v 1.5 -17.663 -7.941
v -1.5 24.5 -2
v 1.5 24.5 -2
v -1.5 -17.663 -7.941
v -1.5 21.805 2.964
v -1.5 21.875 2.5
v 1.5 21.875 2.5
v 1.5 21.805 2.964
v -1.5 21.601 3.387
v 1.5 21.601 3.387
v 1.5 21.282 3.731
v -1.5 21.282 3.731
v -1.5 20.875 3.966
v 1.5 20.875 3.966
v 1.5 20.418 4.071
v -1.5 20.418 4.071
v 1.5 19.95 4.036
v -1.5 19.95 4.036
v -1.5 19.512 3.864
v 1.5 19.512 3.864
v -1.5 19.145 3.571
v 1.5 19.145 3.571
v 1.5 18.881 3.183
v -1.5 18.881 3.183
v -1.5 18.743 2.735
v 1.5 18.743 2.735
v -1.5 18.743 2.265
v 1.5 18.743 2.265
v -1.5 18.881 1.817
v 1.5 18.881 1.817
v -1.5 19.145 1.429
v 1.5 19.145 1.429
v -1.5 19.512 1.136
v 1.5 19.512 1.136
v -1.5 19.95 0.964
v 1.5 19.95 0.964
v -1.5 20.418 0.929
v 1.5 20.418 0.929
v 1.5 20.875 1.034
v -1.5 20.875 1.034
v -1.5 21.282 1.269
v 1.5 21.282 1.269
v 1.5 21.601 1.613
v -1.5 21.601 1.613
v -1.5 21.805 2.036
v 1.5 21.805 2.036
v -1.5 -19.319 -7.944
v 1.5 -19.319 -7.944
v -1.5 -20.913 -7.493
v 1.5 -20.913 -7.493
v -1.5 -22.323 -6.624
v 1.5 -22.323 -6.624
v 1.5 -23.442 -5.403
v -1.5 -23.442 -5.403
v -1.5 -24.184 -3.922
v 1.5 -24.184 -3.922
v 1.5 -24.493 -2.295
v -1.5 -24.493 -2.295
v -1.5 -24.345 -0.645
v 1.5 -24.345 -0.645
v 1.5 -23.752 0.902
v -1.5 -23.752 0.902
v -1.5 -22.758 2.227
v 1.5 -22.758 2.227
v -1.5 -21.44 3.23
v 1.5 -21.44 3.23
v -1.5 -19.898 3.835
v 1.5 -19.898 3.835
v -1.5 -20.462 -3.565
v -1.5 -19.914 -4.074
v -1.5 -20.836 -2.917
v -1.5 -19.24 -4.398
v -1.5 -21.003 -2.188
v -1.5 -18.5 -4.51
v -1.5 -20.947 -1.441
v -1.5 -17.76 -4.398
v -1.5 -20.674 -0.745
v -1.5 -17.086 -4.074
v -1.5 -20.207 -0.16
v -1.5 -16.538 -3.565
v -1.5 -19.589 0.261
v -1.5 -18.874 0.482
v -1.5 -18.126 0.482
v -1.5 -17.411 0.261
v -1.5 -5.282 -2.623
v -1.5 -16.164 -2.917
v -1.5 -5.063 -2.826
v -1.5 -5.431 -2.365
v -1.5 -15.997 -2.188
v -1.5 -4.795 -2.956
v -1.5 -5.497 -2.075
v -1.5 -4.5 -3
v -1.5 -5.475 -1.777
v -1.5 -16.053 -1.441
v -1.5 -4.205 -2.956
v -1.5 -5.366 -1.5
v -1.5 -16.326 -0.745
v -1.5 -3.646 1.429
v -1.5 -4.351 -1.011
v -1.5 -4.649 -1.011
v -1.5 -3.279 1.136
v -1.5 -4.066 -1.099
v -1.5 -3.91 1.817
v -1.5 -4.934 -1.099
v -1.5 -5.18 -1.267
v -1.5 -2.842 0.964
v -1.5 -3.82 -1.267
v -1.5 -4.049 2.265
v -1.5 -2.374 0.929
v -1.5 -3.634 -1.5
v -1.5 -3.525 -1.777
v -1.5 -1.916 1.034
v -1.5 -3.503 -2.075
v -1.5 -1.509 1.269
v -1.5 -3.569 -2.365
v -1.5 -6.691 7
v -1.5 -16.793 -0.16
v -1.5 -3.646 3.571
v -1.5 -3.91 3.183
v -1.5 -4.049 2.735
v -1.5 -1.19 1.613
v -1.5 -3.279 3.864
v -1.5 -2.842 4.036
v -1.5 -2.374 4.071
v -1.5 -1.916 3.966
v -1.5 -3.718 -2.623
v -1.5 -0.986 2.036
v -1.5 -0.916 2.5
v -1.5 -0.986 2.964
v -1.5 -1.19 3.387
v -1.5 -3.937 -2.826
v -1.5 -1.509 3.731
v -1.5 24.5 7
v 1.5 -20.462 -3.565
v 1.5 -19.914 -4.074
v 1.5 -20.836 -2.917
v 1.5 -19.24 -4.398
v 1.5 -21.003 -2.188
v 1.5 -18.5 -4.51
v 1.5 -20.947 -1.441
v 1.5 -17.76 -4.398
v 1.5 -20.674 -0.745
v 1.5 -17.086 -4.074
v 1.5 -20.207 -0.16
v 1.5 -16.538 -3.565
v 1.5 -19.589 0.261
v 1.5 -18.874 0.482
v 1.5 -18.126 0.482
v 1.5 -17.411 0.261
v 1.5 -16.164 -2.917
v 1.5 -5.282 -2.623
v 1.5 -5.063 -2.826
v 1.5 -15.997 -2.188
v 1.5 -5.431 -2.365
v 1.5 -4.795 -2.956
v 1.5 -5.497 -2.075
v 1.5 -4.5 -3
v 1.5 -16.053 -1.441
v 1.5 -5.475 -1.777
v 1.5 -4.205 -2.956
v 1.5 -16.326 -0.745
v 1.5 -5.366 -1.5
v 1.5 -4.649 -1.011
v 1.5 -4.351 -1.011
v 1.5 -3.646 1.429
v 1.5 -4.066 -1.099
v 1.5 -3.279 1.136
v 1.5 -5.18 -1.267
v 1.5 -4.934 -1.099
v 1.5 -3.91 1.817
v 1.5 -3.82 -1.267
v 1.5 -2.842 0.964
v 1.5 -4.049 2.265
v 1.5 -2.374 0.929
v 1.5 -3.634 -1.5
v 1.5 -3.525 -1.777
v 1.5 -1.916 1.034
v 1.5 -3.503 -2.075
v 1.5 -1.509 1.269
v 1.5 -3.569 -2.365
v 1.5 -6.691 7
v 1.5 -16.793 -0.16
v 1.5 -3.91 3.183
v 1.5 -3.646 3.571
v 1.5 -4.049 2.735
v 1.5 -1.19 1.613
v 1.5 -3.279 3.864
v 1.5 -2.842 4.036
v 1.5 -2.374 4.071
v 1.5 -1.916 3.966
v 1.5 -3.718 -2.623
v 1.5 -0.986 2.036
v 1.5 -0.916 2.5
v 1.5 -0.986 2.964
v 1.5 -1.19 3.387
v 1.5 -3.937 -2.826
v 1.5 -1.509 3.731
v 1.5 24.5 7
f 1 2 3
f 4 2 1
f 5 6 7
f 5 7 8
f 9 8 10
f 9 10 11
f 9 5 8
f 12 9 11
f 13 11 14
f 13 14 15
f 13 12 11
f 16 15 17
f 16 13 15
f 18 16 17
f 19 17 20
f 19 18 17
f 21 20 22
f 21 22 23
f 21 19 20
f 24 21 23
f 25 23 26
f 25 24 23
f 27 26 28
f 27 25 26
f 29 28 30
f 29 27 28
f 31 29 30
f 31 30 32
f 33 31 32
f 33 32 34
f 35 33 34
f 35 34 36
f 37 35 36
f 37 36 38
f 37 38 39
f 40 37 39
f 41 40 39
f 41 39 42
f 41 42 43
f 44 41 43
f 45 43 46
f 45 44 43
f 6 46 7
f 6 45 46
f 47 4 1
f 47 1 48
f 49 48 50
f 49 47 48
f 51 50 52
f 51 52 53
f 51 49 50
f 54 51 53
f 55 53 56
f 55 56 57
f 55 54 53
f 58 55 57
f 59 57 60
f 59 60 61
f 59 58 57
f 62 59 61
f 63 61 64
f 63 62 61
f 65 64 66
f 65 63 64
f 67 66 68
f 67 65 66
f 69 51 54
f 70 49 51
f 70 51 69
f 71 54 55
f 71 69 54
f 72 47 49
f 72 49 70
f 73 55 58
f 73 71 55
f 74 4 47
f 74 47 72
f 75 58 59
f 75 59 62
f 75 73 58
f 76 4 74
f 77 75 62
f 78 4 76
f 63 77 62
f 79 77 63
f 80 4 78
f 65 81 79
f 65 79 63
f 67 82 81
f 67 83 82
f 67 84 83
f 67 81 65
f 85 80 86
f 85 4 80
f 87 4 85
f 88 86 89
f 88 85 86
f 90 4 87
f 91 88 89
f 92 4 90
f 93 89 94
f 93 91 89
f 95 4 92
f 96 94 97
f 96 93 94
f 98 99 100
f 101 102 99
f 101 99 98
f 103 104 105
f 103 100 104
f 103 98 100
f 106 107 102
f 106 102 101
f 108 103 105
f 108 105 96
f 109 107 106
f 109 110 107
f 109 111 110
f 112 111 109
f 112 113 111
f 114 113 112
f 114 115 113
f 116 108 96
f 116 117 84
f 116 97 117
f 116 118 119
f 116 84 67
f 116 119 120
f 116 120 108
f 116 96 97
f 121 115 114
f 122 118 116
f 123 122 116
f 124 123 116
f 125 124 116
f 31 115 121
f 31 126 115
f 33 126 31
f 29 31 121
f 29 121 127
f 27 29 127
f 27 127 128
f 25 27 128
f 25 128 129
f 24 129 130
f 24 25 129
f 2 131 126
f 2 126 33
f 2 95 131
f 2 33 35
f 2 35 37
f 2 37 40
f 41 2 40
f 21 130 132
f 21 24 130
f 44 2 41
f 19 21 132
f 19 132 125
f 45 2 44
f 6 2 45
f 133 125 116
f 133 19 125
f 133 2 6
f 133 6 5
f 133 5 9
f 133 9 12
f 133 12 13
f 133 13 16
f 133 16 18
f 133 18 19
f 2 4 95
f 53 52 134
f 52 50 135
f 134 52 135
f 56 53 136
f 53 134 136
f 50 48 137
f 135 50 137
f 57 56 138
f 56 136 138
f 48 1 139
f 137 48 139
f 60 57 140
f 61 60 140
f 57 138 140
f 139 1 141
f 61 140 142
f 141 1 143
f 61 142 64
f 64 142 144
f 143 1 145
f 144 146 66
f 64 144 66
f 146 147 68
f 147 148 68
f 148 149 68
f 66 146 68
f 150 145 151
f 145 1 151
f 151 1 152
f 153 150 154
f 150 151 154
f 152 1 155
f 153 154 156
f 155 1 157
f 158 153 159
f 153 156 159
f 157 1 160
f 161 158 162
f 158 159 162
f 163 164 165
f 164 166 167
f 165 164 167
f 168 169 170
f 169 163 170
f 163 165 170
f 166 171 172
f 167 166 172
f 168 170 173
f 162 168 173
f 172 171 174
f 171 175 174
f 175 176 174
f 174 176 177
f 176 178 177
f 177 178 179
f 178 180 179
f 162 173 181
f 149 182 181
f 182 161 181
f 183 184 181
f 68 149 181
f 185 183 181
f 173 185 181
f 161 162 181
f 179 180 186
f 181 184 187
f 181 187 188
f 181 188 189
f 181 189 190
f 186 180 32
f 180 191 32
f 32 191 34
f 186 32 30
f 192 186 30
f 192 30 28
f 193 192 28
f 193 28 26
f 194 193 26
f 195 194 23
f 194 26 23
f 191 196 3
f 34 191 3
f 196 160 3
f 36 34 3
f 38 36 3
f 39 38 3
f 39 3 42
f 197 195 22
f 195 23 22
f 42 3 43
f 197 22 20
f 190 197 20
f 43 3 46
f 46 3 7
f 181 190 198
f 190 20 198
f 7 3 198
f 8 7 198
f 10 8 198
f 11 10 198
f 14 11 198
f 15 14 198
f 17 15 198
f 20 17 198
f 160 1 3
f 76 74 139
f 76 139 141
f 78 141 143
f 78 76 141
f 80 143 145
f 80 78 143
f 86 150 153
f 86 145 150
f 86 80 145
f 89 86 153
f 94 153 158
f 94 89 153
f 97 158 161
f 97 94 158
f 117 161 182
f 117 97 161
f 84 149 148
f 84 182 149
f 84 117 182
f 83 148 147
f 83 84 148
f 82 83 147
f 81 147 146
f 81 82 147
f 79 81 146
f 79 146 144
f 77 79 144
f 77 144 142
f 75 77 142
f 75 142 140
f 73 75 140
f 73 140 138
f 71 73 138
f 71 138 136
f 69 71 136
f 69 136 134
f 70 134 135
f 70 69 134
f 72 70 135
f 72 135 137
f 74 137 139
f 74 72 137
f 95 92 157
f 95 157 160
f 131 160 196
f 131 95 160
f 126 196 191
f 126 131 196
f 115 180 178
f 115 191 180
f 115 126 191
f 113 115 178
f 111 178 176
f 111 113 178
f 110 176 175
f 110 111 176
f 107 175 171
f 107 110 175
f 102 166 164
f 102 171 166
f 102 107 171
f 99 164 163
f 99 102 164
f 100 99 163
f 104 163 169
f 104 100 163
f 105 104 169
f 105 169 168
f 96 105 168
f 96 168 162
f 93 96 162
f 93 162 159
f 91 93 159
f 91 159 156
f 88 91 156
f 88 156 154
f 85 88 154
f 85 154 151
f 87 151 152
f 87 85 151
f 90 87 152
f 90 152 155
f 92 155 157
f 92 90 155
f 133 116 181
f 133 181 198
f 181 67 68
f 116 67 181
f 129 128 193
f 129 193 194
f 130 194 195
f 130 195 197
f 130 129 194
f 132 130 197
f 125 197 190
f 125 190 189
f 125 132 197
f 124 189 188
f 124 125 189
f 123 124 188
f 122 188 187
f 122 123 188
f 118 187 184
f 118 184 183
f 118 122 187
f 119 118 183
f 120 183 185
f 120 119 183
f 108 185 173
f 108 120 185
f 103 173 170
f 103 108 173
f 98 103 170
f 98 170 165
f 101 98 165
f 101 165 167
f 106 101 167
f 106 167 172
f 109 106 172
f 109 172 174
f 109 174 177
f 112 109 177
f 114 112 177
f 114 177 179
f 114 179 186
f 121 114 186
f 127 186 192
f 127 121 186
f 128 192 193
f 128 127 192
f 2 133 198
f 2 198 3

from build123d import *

# Parameters (mm, degrees)
BOSS_EXTRUDE1_START                        = -1.5
BOSS_EXTRUDE1_DEPTH                        = 3
PIVOTSHAFTHOLE_CUT_DEPTH                   = 26.816661287
PIVOTSHAFTHOLE_CUT_DEPTH_BACK              = 26.816661287
PIVOTSHAFTHOLE_SKETCH_R                    = 2.51
MOUNTHOLESTOENDBLOCKSEEDFODDER_START       = -1.5
MOUNTHOLESTOENDBLOCKSEEDFODDER_OUTLINE_R   = 2.51
MOUNTHOLESTOENDBLOCKSEEDFODDER_DEPTH       = 3
MOUNTHOLESTOENDBLOCKSEED_SKETCH_R          = 1.575
MOUNTHOLESTOENDBLOCKSEED_CUT_DEPTH         = 26.816661287
MOUNTHOLESTOENDBLOCKSEED_PATTERN_START     = -1.5
MOUNTHOLESTOENDBLOCKSEED_PATTERN_OUTLINE_R = 1.575
MOUNTHOLESTOENDBLOCKSEED_PATTERN_DEPTH     = 3
SPRINGANCHORHOLE_CUT_DEPTH                 = 26.816661287
SPRINGANCHORHOLE_CUT_DEPTH_BACK            = 26.816661287
SPRINGANCHORHOLE_SKETCH_R                  = 1


# Read off the part's stored shape, not the designer's step: mountHolesToEndBlockSeedFodder, mountHolesToEndBlockSeed_pattern
with BuildPart() as part:
    # Sketch1 → Boss-Extrude1 (new body)
    with BuildSketch(Plane(origin=(0, 0, 0), x_dir=(0, 0, -1), z_dir=(1, 0, 0)).offset(BOSS_EXTRUDE1_START)):
        with BuildLine():
            Line((2, 24.5), (7.941302937, -17.662790698))
            ThreePointArc((7.941302937, -17.662790698), (3.119056028, -24.394719129), (-3.834772709, -19.898365989))
            Line((-3.834772709, -19.898365989), (-7, -6.69125))
            Line((-7, -6.69125), (-7, 24.5))
            Line((-7, 24.5), (2, 24.5))
        make_face()
    extrude(amount=BOSS_EXTRUDE1_DEPTH)

    # pivotShaftHole_sketch → pivotShaftHole_cut (cut, two sides: drawn at the far end of the back side and taken through both)
    with BuildSketch(Plane(origin=(0, 0, 0), x_dir=(0, 0, -1), z_dir=(1, 0, 0)).offset(-PIVOTSHAFTHOLE_CUT_DEPTH_BACK)):
        with Locations((2, -18.5)):
            Circle(PIVOTSHAFTHOLE_SKETCH_R)
    extrude(amount=PIVOTSHAFTHOLE_CUT_DEPTH + PIVOTSHAFTHOLE_CUT_DEPTH_BACK, mode=Mode.SUBTRACT)

    # mountHolesToEndBlockSeed_pattern outline → mountHolesToEndBlockSeed_pattern (cut)
    with BuildSketch(Plane.YZ.offset(MOUNTHOLESTOENDBLOCKSEED_PATTERN_START)):
        with Locations((-2.49125, 2.5)):
            Circle(MOUNTHOLESTOENDBLOCKSEED_PATTERN_OUTLINE_R)
        with Locations((20.3, 2.5)):
            Circle(MOUNTHOLESTOENDBLOCKSEED_PATTERN_OUTLINE_R)
    extrude(amount=MOUNTHOLESTOENDBLOCKSEED_PATTERN_DEPTH, mode=Mode.SUBTRACT)

    # springAnchorHole_sketch → springAnchorHole_cut (cut, two sides: drawn at the far end of the back side and taken through both)
    with BuildSketch(Plane(origin=(0, 0, 0), x_dir=(0, 0, -1), z_dir=(1, 0, 0)).offset(-SPRINGANCHORHOLE_CUT_DEPTH_BACK)):
        with Locations((2, -4.5)):
            Circle(SPRINGANCHORHOLE_SKETCH_R)
    extrude(amount=SPRINGANCHORHOLE_CUT_DEPTH + SPRINGANCHORHOLE_CUT_DEPTH_BACK, mode=Mode.SUBTRACT)


with BuildPart() as body_2:
    # mountHolesToEndBlockSeedFodder outline → mountHolesToEndBlockSeedFodder (new body)
    with BuildSketch(Plane.YZ.offset(MOUNTHOLESTOENDBLOCKSEEDFODDER_START)):
        with BuildLine():
            Line((24.5, 7), (-6.69125, 7))
            Line((-6.69125, 7), (-19.898365989, 3.834772709))
            ThreePointArc((-19.898365989, 3.834772709), (-24.394719129, -3.119056028), (-17.662790698, -7.941302937))
            Line((-17.662790698, -7.941302937), (24.5, -2))
            Line((24.5, -2), (24.5, 7))
        make_face()
        with Locations((-18.5, -2)):
            Circle(MOUNTHOLESTOENDBLOCKSEEDFODDER_OUTLINE_R, mode=Mode.SUBTRACT)
    extrude(amount=MOUNTHOLESTOENDBLOCKSEEDFODDER_DEPTH)

    # mountHolesToEndBlockSeed_sketch → mountHolesToEndBlockSeed_cut (cut, symmetric)
    with BuildSketch(Plane(origin=(0, 0, 0), x_dir=(0, 0, -1), z_dir=(1, 0, 0))):
        Circle(MOUNTHOLESTOENDBLOCKSEED_SKETCH_R)
    extrude(amount=MOUNTHOLESTOENDBLOCKSEED_CUT_DEPTH, both=True, mode=Mode.SUBTRACT)


solid = part.part
